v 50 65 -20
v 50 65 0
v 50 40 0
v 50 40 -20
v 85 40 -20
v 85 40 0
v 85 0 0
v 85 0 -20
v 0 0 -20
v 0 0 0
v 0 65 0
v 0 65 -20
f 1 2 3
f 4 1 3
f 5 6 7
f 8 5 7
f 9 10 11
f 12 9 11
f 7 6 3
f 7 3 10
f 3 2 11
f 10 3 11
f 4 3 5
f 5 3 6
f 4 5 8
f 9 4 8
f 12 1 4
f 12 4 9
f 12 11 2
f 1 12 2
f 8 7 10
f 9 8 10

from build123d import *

# Parameters (mm, degrees)
RESSALTO_EXTRUS_O2_DEPTH = 20


with BuildPart() as part:
    # Esboço1 → Ressalto-extrusão2 (new body)
    with BuildSketch(Plane.XY):
        Polygon((0, 0), (0, 65), (50, 65), (50, 40), (85, 40), (85, 0), align=None)
    extrude(amount=-RESSALTO_EXTRUS_O2_DEPTH)


solid = part.part
